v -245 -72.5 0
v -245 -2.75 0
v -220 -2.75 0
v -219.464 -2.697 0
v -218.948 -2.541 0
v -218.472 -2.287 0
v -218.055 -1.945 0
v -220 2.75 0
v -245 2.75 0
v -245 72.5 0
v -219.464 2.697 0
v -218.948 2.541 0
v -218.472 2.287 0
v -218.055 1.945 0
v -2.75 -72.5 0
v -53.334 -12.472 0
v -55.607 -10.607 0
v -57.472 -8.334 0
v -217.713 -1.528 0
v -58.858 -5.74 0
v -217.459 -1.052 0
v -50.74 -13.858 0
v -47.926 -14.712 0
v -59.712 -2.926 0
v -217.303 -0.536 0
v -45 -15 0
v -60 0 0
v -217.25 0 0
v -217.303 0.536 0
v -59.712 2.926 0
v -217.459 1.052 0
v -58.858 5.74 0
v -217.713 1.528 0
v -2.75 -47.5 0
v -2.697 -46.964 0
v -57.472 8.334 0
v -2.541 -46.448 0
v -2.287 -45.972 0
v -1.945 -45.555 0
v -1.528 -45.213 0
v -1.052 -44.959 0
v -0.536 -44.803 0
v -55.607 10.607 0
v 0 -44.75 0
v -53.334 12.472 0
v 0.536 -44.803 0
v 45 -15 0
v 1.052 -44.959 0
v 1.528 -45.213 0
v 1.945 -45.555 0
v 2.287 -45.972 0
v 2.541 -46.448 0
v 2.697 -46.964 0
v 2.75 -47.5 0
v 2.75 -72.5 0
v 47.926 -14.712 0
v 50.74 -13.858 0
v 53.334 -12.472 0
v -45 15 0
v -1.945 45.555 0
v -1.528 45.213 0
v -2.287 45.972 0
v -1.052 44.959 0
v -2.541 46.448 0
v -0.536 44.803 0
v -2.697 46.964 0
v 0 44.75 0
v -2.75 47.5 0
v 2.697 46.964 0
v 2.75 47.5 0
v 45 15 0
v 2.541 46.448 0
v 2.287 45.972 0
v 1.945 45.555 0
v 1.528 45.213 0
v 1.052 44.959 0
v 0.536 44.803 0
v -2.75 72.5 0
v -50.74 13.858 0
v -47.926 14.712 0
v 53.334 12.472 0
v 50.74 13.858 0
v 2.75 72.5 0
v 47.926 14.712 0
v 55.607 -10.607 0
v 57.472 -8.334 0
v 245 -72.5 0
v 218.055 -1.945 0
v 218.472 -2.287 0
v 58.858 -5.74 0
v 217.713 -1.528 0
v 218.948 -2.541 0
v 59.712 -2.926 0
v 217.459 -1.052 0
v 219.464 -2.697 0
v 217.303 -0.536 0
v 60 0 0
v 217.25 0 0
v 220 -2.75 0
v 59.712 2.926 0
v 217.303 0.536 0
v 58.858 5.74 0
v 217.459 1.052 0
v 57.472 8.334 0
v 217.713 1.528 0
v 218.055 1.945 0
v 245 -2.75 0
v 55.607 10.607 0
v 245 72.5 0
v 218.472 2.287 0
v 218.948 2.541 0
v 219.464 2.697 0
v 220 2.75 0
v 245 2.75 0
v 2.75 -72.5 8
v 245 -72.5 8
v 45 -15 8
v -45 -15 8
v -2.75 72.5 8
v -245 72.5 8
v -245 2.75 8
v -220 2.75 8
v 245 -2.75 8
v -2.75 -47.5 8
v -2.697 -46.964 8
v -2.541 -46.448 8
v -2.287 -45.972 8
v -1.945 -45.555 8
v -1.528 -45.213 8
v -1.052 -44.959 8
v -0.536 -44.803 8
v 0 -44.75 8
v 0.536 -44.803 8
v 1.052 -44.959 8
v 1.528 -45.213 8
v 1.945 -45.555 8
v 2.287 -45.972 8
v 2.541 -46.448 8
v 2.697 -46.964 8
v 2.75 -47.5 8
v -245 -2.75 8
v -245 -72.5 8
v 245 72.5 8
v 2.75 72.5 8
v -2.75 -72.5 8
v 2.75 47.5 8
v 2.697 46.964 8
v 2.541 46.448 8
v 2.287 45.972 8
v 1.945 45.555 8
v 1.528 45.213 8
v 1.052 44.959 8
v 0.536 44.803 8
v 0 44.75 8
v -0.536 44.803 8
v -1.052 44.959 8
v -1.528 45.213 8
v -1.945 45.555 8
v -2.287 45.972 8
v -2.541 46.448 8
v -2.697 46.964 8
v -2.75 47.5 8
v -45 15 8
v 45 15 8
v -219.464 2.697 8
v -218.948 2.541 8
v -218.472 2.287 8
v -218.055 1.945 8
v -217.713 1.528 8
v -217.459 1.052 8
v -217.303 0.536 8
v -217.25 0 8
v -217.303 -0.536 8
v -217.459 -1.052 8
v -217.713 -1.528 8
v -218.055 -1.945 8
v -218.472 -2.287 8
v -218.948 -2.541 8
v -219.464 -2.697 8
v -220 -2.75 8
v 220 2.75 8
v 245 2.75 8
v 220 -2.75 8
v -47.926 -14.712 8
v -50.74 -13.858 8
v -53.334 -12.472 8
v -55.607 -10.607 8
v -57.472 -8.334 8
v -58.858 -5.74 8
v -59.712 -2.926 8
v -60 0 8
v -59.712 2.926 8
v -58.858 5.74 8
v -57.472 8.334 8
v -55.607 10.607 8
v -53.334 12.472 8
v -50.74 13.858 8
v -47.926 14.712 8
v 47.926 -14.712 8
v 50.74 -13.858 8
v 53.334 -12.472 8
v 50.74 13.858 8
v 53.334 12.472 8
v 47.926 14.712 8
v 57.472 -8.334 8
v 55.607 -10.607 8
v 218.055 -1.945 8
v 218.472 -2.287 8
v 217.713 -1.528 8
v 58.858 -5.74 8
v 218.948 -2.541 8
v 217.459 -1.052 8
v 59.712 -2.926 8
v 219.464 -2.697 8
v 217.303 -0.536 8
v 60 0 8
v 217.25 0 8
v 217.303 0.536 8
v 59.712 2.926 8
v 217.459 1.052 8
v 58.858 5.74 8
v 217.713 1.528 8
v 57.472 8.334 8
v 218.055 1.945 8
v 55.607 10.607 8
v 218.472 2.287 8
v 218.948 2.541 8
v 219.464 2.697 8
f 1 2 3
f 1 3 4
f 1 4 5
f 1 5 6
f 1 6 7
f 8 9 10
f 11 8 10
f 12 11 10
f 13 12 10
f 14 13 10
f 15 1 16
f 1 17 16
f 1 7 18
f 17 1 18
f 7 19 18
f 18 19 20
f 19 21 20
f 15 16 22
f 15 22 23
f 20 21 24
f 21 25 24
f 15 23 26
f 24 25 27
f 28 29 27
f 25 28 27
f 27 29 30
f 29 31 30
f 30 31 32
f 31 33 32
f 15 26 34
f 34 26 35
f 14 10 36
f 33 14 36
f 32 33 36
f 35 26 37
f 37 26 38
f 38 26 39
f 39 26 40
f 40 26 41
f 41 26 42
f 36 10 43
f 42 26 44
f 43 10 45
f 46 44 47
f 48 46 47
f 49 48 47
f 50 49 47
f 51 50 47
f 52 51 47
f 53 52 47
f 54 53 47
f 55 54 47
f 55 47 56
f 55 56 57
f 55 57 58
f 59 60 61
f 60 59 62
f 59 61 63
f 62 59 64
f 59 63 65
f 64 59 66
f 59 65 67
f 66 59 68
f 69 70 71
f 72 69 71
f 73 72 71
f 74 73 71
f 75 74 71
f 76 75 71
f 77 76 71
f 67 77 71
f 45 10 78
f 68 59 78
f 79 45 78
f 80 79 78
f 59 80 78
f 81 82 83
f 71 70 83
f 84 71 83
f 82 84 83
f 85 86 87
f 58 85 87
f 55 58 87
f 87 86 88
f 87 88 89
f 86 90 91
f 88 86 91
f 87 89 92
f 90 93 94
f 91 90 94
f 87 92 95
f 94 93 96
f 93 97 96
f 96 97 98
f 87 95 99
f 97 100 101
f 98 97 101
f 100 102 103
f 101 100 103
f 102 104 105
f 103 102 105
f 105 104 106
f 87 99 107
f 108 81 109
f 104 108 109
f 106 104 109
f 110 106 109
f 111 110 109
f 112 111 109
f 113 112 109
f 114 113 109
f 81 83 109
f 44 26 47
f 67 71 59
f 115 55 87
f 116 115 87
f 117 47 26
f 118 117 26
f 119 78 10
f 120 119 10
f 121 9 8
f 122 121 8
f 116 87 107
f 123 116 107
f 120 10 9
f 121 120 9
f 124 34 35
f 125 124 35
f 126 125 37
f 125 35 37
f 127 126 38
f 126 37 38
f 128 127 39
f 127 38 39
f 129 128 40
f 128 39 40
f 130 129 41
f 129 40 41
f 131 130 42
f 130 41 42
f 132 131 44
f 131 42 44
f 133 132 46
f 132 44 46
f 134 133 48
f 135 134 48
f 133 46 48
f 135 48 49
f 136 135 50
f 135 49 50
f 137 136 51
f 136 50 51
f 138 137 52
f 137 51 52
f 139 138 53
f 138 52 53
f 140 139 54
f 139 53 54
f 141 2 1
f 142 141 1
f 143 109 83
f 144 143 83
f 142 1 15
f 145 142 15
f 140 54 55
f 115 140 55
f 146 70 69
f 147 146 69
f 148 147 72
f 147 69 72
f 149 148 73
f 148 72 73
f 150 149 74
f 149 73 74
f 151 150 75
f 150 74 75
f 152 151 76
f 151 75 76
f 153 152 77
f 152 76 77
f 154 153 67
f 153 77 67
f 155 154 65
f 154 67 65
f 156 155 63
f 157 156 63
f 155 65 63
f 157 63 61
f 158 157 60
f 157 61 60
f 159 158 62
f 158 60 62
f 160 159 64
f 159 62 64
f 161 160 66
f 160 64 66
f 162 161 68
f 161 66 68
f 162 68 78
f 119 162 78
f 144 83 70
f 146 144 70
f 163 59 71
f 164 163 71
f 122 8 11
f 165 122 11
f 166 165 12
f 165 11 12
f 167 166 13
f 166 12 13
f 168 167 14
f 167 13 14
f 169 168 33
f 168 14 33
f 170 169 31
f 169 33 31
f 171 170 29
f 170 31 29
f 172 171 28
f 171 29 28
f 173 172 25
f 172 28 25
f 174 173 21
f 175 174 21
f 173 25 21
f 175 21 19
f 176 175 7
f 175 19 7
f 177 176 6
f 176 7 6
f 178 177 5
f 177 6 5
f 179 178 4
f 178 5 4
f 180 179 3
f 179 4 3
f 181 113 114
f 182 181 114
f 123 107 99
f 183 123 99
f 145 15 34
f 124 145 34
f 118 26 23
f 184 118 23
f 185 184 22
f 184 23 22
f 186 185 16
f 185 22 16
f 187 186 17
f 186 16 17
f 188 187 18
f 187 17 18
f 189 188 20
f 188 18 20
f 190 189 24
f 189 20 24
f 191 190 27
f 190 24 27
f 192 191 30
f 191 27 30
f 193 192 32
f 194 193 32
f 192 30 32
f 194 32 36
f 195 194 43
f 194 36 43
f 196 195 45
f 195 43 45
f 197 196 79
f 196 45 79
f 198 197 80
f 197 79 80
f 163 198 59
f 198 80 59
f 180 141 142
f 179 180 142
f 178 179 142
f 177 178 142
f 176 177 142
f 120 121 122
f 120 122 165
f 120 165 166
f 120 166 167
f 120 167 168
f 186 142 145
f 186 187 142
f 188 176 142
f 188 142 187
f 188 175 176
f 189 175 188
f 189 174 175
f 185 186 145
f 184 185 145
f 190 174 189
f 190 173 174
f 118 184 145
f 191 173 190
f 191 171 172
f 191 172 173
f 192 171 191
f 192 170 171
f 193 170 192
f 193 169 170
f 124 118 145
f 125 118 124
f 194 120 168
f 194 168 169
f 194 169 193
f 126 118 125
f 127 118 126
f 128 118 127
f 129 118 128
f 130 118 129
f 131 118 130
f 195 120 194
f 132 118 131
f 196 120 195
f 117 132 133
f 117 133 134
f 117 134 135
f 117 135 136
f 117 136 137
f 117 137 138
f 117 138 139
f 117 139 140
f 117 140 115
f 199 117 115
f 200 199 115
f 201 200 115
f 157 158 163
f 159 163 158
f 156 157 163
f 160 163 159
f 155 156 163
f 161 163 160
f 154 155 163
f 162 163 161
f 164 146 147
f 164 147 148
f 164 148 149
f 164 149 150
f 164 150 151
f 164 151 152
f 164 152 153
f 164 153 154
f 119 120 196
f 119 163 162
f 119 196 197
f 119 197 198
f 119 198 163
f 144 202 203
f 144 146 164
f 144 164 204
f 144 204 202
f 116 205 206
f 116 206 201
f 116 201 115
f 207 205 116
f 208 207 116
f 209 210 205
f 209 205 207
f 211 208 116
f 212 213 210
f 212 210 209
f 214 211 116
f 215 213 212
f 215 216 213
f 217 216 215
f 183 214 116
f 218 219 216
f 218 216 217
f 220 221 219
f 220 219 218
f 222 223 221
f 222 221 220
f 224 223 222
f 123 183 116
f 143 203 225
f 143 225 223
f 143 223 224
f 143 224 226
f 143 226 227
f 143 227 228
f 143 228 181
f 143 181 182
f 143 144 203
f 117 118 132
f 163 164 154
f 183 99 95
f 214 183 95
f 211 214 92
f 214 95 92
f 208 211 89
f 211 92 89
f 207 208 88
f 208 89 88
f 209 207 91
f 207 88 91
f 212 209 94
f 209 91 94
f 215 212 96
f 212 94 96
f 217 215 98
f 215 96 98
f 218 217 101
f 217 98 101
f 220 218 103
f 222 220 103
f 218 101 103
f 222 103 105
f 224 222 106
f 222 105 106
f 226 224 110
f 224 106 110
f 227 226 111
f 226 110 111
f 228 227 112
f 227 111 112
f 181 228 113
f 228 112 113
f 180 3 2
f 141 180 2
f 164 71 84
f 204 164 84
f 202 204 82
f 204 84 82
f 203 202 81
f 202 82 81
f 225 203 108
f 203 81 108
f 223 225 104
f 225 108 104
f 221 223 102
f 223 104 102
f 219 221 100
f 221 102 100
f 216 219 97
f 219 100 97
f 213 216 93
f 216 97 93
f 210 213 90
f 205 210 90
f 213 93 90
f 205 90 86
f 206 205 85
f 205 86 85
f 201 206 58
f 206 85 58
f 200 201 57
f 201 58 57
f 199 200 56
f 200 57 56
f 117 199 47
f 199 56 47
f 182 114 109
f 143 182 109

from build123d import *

# Parameters (mm, degrees)
BOSS_EXTRUDE3_DEPTH = 8


with BuildPart() as part:
    # Sketch1 → Boss-Extrude3 (new body)
    with BuildSketch(Plane.XY):
        with BuildLine():
            Line((-245, -2.75), (-245, -72.5))
            Line((-245, -72.5), (-2.75, -72.5))
            Line((-2.75, -72.5), (-2.75, -47.5))
            ThreePointArc((-2.75, -47.5), (0, -44.75), (2.75, -47.5))
            Line((2.75, -47.5), (2.75, -72.5))
            Line((2.75, -72.5), (245, -72.5))
            Line((245, -72.5), (245, -2.75))
            Line((245, -2.75), (220, -2.75))
            ThreePointArc((220, -2.75), (217.25, 0), (220, 2.75))
            Line((220, 2.75), (245, 2.75))
            Line((245, 2.75), (245, 72.5))
            Line((245, 72.5), (2.75, 72.5))
            Line((2.75, 72.5), (2.75, 47.5))
            ThreePointArc((2.75, 47.5), (0, 44.75), (-2.75, 47.5))
            Line((-2.75, 47.5), (-2.75, 72.5))
            Line((-2.75, 72.5), (-245, 72.5))
            Line((-245, 72.5), (-245, 2.75))
            Line((-245, 2.75), (-220, 2.75))
            ThreePointArc((-220, 2.75), (-217.25, 0), (-220, -2.75))
            Line((-220, -2.75), (-245, -2.75))
        make_face()
        with BuildLine():
            ThreePointArc((-45, -15), (-60, 0), (-45, 15))
            Line((-45, 15), (45, 15))
            ThreePointArc((45, 15), (60, 0), (45, -15))
            Line((45, -15), (-45, -15))
        make_face(mode=Mode.SUBTRACT)
    extrude(amount=BOSS_EXTRUDE3_DEPTH)


solid = part.part
